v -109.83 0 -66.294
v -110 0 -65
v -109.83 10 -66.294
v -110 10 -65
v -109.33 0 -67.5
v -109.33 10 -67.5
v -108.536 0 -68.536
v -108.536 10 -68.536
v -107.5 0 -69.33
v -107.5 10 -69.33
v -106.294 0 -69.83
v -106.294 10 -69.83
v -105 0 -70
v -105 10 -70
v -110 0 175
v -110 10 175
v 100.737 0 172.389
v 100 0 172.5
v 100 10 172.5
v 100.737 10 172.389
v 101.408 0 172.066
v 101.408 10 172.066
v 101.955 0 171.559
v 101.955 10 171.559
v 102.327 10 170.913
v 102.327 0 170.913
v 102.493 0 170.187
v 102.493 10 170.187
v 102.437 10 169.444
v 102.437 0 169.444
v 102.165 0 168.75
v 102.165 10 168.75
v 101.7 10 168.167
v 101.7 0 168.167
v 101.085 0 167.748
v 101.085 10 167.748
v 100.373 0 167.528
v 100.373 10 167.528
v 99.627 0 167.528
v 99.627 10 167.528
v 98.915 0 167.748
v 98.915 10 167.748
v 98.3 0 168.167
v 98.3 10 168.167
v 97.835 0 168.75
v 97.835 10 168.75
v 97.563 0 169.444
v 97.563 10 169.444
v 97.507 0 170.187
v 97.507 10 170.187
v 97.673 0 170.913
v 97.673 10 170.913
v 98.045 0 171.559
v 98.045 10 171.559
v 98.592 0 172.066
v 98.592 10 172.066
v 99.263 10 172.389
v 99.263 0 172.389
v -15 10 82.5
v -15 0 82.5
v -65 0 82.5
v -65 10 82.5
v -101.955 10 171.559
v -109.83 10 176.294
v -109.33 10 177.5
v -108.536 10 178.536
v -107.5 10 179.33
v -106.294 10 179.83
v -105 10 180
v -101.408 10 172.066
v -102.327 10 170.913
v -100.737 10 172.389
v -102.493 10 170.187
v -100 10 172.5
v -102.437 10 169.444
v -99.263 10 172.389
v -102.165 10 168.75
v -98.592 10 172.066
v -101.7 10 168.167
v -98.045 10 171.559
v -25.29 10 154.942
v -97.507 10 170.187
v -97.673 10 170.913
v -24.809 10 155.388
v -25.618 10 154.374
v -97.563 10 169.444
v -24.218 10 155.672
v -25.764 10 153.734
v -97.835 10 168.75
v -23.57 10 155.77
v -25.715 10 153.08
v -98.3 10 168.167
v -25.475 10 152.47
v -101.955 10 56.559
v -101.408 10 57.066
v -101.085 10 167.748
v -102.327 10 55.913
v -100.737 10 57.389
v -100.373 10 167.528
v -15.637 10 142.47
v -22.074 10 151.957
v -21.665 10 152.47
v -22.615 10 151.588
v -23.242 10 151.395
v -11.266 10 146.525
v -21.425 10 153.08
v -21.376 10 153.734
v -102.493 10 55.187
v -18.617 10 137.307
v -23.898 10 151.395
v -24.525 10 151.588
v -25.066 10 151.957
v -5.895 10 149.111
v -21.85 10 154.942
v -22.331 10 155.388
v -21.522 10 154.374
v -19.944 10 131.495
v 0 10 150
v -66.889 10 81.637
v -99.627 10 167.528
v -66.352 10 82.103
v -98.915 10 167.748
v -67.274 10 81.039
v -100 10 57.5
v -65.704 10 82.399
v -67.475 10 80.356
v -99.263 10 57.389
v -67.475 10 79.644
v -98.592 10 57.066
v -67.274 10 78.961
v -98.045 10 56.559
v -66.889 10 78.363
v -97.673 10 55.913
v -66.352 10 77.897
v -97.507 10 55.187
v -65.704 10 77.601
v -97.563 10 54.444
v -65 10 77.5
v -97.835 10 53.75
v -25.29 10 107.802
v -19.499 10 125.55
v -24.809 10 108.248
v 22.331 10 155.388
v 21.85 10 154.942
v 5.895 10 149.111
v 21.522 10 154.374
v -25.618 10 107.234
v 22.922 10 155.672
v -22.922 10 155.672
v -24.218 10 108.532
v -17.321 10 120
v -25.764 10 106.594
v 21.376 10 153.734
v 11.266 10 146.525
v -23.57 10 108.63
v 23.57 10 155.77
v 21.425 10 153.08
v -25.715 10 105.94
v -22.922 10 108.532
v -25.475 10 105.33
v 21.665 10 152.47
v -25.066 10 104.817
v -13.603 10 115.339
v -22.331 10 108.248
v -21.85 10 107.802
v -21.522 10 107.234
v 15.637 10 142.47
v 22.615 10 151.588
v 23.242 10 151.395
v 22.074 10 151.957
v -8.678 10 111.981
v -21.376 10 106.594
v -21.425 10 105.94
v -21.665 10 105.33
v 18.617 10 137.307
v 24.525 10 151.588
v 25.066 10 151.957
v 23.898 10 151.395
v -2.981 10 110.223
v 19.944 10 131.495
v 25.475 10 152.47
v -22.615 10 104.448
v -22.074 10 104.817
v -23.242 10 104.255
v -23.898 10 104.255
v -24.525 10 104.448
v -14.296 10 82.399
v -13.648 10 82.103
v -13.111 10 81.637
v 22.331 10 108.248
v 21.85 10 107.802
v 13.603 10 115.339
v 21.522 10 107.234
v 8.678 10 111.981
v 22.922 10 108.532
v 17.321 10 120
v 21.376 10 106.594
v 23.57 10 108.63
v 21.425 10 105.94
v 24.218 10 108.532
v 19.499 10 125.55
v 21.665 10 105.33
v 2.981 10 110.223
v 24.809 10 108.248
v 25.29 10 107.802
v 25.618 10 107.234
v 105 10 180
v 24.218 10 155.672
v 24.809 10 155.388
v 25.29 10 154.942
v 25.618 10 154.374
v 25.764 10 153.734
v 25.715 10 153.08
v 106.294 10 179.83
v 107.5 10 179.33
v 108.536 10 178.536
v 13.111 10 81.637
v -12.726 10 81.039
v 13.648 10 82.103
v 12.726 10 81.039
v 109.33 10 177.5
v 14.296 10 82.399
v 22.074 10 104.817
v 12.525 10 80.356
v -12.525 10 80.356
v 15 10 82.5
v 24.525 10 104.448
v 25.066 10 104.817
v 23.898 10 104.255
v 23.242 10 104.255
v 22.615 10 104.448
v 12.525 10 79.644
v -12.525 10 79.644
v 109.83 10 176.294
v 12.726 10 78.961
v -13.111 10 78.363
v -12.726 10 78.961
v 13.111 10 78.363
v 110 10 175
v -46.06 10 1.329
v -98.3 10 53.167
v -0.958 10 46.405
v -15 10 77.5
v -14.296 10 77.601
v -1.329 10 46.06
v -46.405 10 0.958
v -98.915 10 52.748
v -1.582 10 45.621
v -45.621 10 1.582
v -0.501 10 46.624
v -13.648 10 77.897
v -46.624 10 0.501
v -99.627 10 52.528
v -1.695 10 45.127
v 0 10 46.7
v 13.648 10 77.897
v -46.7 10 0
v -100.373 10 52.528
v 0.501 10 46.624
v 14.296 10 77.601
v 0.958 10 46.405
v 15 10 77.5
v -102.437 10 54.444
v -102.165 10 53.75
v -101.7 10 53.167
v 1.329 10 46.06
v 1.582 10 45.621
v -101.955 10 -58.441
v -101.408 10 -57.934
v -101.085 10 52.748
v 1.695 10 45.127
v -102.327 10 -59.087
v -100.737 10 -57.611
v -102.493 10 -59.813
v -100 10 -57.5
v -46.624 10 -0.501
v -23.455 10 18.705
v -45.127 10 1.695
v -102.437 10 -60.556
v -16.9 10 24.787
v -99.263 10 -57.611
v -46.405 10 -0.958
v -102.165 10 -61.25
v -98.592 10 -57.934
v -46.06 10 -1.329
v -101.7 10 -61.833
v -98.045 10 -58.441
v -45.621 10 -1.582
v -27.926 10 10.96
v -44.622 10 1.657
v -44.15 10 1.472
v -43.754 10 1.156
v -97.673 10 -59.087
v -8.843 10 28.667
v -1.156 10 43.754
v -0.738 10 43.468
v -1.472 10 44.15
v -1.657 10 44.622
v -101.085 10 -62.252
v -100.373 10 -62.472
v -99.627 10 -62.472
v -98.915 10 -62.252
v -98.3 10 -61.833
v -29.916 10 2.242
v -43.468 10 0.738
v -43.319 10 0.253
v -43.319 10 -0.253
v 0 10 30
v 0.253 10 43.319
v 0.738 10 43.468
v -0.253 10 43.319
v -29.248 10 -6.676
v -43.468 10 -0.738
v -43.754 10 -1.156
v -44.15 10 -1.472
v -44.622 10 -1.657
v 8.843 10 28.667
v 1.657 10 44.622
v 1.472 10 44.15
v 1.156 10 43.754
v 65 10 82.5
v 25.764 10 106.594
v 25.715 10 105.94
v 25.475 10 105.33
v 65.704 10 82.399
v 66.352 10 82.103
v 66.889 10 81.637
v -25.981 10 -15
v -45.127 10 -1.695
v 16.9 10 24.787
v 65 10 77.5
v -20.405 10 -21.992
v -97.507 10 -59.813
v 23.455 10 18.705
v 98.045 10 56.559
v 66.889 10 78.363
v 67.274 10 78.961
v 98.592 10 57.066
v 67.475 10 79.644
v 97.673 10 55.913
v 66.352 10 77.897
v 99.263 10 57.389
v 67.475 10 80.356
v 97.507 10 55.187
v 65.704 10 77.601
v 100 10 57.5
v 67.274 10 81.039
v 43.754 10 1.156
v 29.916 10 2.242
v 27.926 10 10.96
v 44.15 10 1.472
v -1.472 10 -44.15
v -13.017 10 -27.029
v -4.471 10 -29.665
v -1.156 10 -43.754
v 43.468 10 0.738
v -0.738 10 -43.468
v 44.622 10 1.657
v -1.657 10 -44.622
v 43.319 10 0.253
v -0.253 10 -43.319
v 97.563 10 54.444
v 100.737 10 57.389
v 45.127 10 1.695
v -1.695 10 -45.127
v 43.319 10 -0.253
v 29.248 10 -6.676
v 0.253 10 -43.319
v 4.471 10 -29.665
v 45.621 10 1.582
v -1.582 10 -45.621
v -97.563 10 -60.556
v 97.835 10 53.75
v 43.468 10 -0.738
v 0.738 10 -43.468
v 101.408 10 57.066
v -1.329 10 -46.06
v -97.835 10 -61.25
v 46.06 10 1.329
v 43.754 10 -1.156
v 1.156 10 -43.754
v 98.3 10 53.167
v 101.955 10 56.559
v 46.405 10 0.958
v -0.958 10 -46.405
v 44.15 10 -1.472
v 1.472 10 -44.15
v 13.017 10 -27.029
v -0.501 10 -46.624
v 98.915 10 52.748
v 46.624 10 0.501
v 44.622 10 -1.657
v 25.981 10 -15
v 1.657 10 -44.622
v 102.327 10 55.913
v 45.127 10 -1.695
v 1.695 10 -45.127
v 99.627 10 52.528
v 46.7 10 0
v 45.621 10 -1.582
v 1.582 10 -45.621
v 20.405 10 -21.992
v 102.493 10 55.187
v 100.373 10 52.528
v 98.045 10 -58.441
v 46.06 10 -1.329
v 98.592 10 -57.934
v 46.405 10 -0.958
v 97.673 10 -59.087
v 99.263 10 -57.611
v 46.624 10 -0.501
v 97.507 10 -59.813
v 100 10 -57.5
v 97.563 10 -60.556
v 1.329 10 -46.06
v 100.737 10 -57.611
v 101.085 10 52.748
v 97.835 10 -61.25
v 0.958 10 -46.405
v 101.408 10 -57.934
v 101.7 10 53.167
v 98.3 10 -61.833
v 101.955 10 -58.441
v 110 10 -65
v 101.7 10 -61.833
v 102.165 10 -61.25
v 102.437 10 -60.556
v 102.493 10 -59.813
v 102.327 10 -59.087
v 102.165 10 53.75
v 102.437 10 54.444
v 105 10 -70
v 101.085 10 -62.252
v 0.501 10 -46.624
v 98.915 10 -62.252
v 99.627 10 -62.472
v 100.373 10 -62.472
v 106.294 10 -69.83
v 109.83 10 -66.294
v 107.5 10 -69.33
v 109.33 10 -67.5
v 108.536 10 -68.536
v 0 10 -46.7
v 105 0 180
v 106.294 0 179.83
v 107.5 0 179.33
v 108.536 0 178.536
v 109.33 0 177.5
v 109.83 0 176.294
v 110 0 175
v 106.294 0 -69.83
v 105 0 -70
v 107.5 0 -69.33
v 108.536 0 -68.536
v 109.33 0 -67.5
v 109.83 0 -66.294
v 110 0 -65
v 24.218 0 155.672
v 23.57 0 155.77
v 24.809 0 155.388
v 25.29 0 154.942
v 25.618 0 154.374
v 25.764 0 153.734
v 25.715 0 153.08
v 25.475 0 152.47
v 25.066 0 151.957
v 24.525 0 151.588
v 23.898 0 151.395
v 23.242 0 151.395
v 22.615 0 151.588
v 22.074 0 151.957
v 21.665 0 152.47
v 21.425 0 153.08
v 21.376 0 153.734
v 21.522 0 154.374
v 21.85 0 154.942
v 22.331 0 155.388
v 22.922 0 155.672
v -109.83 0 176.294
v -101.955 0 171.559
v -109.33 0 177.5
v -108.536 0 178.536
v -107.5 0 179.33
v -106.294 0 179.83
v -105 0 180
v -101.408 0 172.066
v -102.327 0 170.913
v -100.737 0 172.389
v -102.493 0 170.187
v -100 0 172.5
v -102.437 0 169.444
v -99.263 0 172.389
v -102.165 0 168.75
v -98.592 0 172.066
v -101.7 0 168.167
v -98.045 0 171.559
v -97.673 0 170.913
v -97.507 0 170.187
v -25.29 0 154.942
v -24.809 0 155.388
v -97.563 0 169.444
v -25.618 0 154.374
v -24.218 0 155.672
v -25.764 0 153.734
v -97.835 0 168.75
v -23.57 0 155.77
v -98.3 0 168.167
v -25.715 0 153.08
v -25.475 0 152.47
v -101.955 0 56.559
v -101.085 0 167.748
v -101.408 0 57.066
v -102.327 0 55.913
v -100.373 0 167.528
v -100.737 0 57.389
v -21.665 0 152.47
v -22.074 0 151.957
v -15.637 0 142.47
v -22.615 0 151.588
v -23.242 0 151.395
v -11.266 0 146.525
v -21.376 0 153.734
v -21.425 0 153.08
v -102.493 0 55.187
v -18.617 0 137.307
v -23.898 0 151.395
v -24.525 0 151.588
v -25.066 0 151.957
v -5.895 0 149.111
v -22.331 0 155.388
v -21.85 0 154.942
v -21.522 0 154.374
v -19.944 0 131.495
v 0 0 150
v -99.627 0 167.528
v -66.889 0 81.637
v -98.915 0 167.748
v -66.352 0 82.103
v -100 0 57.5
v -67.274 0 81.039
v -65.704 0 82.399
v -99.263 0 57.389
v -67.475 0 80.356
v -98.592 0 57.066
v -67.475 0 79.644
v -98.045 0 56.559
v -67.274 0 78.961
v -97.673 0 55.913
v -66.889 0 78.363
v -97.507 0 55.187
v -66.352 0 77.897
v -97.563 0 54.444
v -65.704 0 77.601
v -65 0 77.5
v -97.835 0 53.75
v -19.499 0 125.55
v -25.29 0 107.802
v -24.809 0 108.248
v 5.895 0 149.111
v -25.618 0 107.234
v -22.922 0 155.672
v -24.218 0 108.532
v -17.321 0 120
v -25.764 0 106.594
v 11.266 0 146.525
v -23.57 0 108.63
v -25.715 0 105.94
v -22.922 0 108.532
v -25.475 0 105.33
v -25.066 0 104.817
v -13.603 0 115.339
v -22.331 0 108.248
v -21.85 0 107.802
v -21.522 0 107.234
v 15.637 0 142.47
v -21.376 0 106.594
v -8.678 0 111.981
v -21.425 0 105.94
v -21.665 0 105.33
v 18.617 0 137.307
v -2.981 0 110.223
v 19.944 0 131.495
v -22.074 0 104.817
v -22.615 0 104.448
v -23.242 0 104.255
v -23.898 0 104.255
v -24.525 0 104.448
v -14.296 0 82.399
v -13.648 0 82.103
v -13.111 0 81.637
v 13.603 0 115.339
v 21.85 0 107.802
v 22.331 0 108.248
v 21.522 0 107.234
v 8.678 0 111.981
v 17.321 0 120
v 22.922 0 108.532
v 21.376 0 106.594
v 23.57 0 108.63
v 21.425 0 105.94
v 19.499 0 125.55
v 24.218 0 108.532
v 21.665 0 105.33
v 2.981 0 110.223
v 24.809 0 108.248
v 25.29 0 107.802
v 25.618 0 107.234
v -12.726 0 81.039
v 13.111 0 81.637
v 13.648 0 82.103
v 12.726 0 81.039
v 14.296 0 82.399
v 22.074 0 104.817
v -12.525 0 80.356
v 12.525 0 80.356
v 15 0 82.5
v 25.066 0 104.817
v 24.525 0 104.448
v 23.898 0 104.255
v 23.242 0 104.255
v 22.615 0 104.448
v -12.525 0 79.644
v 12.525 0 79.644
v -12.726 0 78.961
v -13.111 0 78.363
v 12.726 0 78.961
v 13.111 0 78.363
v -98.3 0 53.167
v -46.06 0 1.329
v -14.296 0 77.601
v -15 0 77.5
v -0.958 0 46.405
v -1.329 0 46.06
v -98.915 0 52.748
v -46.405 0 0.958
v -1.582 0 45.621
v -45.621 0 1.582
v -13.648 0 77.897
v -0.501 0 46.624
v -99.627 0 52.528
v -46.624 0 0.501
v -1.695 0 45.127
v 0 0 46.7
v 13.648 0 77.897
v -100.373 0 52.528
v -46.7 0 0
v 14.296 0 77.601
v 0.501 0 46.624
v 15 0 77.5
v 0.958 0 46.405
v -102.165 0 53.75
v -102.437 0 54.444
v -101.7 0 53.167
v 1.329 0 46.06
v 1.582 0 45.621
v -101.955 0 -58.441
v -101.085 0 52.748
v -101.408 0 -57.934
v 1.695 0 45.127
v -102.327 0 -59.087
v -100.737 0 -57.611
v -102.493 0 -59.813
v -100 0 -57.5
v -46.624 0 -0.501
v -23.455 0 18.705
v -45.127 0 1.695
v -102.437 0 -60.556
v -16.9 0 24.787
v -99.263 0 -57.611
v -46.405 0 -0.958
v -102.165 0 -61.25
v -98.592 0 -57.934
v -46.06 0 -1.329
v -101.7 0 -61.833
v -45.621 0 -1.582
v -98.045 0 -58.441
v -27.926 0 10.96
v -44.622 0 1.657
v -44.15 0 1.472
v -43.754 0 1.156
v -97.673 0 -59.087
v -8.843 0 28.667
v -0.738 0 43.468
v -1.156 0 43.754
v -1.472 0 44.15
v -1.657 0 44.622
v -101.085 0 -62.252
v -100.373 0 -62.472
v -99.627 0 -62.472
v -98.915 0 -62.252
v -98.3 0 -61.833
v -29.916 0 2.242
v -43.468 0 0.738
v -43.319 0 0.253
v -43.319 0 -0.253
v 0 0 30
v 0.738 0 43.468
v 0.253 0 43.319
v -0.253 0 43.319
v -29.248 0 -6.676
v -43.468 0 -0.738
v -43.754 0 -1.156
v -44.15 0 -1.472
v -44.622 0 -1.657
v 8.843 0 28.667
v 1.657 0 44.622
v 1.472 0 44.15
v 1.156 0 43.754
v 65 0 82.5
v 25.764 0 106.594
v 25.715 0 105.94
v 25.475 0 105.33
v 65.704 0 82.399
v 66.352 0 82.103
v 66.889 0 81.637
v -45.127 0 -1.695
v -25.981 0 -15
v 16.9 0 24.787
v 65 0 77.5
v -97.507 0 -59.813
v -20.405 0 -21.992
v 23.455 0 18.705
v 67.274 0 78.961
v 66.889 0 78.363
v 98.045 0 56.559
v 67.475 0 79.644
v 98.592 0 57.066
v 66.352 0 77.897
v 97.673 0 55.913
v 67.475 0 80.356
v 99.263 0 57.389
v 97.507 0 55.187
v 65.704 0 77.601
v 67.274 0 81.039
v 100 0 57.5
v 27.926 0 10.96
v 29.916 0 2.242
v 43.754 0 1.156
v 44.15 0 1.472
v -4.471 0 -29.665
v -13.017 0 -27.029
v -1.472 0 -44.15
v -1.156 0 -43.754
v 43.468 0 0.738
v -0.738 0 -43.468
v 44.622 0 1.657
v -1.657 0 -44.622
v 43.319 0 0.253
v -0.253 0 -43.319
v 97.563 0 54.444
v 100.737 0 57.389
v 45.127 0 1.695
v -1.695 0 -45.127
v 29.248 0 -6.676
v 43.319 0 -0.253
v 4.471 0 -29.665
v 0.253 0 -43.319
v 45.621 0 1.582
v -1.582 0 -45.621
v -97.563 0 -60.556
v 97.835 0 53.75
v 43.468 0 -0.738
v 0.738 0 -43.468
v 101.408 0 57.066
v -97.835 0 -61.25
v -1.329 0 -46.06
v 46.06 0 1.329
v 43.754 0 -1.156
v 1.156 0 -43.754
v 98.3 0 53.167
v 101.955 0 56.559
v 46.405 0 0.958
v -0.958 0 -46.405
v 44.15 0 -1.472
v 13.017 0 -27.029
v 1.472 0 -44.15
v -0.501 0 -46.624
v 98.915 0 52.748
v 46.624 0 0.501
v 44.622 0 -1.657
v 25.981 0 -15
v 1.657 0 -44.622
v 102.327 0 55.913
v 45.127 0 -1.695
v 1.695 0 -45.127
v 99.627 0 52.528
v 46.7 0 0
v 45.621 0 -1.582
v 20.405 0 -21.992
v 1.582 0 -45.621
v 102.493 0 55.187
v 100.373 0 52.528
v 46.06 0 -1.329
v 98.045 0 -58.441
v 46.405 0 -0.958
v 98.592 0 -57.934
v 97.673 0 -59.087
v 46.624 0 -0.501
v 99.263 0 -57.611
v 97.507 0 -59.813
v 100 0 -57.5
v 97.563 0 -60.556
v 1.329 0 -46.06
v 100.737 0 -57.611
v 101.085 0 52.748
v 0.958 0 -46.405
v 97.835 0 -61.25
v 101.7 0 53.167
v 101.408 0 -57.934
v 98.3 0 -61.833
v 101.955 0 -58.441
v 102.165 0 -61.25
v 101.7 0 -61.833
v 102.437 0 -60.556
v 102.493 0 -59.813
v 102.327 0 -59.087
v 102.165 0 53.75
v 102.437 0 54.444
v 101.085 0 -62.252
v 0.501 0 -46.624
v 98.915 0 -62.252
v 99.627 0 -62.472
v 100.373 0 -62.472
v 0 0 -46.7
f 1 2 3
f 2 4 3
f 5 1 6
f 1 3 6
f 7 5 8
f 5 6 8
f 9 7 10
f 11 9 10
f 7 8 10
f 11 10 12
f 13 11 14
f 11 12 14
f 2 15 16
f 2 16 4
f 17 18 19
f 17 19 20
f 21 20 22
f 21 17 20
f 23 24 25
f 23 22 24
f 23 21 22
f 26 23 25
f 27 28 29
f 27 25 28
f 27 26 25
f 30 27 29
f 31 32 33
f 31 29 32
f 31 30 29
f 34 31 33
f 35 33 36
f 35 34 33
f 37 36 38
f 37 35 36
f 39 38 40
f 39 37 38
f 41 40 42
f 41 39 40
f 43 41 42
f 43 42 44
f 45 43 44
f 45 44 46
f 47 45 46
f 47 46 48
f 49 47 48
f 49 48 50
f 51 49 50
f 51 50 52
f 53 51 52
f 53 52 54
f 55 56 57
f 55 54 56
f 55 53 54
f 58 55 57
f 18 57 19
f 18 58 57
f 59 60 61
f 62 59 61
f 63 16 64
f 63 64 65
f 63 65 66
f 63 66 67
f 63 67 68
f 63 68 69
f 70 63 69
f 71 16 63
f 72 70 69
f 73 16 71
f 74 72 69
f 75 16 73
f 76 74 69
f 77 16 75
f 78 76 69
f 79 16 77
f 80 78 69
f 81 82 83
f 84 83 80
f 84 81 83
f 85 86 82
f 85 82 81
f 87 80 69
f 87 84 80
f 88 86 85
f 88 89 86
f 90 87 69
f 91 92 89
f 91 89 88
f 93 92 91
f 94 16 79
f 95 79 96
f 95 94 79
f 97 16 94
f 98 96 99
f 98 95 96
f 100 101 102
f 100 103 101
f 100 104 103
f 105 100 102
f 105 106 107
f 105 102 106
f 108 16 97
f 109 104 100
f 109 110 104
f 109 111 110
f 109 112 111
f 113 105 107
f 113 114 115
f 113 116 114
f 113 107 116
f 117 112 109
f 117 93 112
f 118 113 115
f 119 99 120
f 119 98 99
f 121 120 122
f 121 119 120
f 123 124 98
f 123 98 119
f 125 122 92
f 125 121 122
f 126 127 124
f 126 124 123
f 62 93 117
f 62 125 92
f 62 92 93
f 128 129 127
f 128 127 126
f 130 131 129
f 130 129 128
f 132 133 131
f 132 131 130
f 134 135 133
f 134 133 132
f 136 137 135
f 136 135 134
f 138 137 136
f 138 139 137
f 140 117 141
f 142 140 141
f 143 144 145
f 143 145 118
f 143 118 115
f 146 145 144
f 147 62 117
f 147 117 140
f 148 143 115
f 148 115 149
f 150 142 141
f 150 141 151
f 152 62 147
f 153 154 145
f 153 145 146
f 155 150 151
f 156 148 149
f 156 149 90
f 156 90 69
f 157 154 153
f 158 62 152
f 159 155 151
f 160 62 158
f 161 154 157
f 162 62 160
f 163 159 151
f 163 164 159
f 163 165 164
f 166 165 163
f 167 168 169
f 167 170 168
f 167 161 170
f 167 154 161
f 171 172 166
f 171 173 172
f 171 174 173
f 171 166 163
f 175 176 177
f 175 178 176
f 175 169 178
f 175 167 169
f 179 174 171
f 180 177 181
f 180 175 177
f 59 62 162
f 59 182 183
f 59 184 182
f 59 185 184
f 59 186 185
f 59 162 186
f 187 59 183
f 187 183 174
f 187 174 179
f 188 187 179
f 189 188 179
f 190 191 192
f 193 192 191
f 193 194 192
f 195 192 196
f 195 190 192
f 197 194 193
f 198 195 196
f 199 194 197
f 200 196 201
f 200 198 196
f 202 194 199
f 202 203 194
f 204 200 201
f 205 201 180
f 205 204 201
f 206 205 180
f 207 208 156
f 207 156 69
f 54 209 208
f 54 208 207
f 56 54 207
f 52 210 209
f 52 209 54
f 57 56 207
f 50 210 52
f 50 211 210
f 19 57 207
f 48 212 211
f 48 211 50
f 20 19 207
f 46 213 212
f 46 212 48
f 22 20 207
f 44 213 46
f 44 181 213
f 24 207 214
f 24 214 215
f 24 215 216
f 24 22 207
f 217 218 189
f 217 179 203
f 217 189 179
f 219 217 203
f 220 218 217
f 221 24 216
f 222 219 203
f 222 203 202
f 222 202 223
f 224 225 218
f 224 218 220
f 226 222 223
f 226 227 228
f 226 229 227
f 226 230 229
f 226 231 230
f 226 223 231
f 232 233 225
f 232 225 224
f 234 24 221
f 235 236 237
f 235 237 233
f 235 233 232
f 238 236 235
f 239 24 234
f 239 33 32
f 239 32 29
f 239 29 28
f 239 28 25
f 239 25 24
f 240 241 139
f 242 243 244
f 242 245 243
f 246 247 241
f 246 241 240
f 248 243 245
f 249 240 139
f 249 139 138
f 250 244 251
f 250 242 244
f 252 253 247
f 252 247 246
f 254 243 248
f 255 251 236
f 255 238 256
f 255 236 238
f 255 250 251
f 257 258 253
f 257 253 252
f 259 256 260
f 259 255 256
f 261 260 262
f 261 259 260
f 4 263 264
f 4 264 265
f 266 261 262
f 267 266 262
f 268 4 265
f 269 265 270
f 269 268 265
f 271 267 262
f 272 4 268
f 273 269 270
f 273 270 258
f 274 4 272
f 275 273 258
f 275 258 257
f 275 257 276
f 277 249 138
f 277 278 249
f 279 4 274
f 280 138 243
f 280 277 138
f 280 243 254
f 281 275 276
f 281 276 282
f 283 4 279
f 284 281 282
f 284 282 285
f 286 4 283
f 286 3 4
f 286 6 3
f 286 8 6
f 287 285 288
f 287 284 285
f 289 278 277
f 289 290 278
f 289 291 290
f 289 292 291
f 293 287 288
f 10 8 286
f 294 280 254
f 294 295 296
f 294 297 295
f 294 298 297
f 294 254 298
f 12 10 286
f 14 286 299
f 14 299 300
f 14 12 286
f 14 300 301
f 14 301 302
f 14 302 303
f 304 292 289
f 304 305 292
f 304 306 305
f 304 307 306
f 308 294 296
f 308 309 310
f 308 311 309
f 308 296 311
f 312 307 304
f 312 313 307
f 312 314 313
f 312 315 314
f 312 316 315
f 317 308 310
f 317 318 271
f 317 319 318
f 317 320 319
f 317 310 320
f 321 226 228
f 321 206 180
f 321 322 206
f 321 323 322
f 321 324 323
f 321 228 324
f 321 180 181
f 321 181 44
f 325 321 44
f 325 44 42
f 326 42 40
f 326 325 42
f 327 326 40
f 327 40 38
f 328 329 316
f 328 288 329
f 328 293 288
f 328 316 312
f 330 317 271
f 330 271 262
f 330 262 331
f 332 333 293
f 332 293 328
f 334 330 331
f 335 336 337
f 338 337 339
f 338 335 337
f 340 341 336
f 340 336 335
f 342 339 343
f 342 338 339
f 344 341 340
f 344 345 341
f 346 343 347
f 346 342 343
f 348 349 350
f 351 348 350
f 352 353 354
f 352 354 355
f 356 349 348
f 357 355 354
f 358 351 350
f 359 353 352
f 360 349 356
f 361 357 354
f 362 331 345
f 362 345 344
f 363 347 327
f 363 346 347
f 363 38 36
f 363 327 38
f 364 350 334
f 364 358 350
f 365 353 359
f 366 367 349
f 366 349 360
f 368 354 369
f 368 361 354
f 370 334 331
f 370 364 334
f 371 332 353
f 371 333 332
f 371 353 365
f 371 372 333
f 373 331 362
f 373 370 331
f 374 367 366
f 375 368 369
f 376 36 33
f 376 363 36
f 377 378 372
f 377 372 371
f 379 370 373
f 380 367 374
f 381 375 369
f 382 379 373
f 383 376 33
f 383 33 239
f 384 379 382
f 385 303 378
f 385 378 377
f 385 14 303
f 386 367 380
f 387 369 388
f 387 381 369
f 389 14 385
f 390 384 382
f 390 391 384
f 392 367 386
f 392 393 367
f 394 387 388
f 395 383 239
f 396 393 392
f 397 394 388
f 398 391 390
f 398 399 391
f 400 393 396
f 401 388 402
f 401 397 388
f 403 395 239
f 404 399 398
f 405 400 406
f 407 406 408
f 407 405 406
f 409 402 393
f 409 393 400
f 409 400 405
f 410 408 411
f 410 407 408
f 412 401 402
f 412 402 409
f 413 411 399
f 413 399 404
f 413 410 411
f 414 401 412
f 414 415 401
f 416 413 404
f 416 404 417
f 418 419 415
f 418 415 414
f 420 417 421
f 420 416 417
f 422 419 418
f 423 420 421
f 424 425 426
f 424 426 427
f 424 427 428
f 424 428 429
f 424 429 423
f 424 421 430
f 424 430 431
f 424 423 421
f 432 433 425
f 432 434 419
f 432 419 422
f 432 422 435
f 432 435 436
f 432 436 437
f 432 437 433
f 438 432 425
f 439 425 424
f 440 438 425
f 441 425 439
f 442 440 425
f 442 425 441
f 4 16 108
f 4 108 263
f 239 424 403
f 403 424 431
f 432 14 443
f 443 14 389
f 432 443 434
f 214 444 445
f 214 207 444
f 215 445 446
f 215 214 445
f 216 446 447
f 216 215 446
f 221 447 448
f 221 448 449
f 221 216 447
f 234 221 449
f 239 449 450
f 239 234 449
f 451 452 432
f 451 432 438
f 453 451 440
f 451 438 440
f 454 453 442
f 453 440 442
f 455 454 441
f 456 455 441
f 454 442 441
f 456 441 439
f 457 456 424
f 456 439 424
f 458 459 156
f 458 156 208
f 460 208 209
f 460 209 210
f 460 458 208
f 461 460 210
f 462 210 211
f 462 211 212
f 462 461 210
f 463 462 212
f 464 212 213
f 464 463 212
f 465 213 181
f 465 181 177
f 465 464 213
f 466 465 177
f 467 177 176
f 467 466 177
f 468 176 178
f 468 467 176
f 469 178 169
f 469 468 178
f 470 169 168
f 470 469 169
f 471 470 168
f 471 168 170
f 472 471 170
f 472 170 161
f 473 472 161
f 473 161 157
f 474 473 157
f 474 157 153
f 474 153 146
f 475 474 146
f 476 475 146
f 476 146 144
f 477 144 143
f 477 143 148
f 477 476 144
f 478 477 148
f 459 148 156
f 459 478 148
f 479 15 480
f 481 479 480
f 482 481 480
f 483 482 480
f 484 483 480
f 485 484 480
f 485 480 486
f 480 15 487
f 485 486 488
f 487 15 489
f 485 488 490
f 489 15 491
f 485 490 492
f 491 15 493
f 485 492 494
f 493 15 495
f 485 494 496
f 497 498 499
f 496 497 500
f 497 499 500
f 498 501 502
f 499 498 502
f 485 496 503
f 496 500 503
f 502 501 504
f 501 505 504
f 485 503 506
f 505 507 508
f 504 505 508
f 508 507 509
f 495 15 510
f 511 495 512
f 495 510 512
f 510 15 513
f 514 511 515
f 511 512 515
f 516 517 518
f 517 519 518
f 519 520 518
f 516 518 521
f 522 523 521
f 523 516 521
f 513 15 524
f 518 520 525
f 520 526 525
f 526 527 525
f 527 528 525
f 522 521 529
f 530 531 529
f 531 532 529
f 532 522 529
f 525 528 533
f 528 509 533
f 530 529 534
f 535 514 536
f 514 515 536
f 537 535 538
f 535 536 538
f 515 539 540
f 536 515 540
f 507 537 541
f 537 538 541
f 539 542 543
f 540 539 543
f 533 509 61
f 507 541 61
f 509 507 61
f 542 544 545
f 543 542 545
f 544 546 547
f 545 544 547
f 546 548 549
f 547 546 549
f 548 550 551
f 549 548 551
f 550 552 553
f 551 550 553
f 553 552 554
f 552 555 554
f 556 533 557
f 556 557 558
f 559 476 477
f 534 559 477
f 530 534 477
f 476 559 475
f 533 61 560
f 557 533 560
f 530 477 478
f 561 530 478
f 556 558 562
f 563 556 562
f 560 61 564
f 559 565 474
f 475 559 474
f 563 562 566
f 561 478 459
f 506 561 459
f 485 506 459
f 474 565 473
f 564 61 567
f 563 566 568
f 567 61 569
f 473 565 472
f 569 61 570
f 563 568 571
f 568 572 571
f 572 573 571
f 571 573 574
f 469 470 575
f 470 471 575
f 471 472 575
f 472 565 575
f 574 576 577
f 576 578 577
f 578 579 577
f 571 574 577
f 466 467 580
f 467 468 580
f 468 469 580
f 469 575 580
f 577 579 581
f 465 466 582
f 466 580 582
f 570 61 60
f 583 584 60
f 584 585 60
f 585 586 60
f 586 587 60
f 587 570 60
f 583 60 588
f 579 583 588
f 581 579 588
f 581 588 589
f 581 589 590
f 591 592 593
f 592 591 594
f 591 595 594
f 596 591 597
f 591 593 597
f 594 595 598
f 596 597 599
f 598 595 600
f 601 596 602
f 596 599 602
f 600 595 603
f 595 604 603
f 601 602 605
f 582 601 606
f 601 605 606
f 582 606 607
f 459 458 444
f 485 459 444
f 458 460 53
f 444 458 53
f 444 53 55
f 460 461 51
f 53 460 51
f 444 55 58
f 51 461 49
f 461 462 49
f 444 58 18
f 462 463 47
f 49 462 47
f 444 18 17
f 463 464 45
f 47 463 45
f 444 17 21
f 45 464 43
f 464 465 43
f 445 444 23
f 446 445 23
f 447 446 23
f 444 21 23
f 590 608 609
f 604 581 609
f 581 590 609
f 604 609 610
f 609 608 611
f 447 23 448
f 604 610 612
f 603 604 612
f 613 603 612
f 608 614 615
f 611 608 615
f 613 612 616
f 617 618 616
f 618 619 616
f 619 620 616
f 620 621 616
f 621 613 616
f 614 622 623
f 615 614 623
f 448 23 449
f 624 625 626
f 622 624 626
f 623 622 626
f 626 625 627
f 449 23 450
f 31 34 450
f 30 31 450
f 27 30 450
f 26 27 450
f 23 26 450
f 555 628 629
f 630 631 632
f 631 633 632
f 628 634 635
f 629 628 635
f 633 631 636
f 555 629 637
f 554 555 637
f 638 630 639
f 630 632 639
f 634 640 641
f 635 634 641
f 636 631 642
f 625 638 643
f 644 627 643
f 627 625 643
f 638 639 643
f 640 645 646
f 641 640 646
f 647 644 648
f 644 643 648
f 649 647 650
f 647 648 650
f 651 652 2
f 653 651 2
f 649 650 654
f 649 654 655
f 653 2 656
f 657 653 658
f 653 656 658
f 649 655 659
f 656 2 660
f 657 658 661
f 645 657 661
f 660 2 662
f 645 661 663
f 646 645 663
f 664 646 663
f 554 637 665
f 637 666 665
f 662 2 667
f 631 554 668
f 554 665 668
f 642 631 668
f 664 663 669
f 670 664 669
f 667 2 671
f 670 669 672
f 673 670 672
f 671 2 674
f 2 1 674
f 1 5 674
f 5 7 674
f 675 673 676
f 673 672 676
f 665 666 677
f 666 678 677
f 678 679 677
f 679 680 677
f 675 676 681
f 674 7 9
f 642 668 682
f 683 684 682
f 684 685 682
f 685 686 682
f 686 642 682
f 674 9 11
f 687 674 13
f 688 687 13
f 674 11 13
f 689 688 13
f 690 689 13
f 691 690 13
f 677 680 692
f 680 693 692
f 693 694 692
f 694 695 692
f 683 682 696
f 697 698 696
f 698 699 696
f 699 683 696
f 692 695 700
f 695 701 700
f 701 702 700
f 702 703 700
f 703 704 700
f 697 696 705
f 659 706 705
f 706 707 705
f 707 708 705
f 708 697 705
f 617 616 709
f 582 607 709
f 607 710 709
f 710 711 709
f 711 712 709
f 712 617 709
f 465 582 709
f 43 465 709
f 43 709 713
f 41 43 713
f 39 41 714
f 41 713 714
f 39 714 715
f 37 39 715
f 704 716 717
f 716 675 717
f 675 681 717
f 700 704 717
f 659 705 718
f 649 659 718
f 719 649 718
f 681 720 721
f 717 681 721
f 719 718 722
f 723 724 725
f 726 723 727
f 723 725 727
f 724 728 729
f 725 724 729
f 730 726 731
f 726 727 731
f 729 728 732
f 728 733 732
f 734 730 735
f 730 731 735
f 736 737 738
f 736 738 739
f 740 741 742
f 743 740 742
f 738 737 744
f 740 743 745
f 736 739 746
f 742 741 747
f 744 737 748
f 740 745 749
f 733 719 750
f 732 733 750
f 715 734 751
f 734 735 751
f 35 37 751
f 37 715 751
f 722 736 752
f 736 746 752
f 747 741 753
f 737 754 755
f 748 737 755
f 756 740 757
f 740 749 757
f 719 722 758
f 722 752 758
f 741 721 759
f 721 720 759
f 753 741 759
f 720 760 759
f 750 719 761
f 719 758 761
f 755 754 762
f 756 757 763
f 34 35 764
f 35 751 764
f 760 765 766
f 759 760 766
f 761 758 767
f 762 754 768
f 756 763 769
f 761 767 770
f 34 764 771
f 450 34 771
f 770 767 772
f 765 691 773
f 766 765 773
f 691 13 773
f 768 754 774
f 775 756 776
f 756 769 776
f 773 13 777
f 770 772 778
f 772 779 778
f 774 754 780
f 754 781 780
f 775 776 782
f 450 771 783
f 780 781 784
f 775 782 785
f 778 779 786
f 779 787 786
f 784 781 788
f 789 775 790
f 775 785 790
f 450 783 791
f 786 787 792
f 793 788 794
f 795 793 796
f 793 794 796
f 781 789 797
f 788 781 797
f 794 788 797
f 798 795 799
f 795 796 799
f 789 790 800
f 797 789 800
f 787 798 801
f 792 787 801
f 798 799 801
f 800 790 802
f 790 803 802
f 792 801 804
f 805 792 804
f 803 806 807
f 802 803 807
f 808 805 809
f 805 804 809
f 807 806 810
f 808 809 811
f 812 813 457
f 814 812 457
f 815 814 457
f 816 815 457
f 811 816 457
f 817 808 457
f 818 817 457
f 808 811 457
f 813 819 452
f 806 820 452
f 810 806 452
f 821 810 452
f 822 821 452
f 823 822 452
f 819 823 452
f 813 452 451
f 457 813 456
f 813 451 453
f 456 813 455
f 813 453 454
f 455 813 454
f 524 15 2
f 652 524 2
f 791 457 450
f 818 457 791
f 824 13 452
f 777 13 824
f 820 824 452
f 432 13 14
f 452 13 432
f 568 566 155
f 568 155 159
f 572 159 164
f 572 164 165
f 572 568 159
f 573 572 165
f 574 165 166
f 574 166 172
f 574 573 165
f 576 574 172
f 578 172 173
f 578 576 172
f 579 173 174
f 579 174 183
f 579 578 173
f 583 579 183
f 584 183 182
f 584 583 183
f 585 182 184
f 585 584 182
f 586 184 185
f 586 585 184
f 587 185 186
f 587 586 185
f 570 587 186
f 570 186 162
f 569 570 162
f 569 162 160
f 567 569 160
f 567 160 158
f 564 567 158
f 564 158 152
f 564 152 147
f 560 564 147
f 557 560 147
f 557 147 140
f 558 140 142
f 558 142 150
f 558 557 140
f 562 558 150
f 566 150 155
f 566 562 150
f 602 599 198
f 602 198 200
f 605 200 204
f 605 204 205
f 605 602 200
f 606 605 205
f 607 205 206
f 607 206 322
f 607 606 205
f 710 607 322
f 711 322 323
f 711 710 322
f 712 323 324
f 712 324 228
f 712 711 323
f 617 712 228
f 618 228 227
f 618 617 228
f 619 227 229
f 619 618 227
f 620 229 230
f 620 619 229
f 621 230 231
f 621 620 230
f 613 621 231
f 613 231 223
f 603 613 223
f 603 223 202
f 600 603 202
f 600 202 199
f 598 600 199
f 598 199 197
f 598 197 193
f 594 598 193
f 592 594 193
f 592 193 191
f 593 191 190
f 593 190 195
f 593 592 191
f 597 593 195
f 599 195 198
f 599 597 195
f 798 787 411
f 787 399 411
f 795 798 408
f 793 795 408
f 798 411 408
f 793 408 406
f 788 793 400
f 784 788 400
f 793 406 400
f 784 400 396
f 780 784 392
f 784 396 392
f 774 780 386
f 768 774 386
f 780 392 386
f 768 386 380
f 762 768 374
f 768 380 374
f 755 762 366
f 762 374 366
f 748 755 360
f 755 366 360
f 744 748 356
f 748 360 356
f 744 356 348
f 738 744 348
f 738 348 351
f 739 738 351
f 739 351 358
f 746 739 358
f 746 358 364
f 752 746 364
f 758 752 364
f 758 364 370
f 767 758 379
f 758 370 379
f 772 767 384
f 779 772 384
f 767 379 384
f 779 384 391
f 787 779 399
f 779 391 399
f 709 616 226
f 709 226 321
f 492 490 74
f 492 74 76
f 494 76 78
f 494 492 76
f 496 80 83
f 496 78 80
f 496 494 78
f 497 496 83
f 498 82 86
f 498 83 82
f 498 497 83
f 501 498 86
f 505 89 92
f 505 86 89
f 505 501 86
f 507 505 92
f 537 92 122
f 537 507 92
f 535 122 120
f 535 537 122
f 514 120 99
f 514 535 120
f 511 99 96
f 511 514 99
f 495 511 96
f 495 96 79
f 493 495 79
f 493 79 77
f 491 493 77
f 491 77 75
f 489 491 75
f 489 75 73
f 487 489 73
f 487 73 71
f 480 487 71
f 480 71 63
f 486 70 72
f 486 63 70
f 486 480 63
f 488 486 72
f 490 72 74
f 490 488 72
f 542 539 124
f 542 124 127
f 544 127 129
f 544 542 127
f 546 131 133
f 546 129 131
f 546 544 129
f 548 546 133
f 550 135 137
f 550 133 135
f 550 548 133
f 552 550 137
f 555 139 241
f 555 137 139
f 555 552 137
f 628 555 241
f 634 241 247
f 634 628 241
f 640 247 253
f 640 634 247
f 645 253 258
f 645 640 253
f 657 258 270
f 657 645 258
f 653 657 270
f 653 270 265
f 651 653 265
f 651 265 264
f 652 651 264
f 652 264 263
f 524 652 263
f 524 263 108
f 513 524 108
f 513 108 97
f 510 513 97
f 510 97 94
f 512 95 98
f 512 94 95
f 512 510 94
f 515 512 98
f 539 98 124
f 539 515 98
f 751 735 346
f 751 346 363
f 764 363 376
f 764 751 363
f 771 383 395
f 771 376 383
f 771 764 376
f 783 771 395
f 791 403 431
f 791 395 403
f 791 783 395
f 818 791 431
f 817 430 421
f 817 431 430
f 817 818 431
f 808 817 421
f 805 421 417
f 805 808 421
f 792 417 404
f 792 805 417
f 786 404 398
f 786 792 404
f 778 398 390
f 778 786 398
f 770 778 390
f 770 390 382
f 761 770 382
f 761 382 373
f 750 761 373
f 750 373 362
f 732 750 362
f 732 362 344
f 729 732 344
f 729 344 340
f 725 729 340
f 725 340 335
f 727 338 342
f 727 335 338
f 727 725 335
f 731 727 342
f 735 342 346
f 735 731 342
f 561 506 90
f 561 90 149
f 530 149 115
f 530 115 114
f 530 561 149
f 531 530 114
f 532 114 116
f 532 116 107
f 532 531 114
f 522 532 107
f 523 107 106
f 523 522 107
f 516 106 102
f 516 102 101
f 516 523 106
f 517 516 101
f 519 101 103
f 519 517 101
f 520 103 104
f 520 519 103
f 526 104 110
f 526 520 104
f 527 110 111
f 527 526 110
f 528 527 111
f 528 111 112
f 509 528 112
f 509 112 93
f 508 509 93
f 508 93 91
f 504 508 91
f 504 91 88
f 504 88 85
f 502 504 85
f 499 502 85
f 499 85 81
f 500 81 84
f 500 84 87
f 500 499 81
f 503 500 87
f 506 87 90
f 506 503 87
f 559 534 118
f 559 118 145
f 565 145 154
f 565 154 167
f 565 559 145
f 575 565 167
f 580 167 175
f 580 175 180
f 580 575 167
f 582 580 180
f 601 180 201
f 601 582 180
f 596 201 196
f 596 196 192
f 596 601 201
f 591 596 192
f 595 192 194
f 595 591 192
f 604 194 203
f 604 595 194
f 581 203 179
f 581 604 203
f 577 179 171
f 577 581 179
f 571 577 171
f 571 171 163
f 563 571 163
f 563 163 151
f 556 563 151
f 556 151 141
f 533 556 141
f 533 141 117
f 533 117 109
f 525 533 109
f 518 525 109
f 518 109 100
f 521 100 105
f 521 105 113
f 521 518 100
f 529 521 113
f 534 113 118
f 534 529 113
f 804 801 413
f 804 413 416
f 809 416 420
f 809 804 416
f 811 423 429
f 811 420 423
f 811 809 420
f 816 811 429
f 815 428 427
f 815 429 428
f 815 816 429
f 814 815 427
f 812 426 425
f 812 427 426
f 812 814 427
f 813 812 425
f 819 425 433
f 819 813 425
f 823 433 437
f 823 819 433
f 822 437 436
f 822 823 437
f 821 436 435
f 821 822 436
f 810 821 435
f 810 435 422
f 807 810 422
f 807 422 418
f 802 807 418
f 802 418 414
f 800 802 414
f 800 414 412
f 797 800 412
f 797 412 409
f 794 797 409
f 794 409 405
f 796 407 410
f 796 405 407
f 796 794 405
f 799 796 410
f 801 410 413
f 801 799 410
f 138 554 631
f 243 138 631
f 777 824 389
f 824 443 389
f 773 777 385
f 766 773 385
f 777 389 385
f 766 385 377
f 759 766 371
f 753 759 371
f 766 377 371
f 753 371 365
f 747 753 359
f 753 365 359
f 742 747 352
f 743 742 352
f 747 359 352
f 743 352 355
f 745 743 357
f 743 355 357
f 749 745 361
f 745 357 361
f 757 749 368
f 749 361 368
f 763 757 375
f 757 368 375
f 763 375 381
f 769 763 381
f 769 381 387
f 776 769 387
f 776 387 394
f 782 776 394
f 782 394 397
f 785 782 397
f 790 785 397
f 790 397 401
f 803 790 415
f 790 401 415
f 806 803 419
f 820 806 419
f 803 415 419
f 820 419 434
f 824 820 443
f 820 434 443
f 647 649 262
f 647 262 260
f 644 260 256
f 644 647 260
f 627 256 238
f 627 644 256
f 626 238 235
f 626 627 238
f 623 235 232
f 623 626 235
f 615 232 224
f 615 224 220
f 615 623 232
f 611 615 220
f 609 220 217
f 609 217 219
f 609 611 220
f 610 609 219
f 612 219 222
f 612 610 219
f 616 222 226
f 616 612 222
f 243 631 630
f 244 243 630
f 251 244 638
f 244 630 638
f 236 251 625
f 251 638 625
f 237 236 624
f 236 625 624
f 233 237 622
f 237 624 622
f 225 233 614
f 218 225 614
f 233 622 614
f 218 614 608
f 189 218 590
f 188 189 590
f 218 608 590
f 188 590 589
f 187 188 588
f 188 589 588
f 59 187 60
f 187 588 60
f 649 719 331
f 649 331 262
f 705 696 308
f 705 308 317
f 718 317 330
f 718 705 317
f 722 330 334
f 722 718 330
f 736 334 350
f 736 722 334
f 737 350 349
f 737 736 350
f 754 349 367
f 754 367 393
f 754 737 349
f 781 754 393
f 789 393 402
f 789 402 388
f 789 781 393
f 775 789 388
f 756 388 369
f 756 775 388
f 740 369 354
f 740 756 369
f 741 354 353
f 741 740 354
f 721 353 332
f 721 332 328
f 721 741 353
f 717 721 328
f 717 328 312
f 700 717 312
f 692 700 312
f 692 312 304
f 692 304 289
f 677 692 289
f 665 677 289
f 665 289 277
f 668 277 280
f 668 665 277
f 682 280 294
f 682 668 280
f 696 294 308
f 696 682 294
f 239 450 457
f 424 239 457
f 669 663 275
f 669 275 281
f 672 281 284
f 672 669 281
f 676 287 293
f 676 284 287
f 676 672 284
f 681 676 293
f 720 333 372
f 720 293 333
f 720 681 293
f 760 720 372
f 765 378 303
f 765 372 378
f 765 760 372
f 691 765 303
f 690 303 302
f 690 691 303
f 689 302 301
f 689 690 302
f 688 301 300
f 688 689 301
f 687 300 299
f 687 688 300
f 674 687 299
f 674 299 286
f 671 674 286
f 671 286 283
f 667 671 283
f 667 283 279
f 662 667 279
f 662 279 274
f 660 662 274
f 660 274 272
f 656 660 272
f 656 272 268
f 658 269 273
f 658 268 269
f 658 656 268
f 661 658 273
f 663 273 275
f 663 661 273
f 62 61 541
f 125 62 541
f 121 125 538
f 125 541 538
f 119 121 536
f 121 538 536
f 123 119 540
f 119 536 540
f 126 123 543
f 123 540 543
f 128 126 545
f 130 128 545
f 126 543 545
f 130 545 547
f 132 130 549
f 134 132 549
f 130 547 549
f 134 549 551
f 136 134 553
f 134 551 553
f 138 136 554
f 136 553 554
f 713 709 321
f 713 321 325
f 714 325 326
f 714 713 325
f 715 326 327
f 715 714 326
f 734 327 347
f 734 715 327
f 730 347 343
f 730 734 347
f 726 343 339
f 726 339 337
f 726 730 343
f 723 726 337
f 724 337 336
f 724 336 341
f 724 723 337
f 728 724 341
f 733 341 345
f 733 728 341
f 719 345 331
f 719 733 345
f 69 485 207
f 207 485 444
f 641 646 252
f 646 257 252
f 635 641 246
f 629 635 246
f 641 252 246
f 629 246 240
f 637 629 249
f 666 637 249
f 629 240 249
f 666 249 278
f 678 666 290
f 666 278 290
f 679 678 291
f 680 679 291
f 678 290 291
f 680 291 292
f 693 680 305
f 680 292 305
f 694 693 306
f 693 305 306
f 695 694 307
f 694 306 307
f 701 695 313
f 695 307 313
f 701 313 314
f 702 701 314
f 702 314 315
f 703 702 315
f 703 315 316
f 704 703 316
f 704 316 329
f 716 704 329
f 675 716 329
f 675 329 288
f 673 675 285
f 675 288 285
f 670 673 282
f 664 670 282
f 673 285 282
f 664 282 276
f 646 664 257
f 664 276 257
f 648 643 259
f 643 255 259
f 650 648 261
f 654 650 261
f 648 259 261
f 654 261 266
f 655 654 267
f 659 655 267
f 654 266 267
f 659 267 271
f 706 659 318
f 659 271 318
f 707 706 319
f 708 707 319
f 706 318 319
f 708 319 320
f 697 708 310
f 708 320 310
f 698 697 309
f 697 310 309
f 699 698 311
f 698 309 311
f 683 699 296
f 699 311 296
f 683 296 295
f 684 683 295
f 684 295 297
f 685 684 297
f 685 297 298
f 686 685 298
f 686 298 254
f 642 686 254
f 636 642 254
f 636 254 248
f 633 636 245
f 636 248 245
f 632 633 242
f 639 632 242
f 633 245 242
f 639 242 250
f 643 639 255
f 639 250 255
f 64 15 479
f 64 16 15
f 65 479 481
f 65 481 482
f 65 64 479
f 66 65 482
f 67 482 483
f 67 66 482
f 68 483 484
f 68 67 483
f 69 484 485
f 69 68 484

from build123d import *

# Parameters (mm, degrees)
SKETCH1_W               = 220
SKETCH1_H               = 250
SKETCH1_R               = 30
SKETCH1_R_2             = 20
SKETCH1_R_3             = 2.2
BOSS_EXTRUDE1_DEPTH     = 10
CUT_EXTRUDE1_DEPTH      = 212.187120819
CUT_EXTRUDE1_DEPTH_BACK = 212.187120819
SKETCH2_R               = 2.5
FILLET1_R               = 5
SKETCH4_R               = 1.7
CUT_EXTRUDE2_DEPTH      = 212.187120819
CIRPATTERN1_COUNT       = 4


with BuildPart() as part:
    # Sketch1 → Boss-Extrude1 (new body)
    with BuildSketch(Plane(origin=(0, 0, 0), x_dir=(1, 0, 0), z_dir=(0, 1, 0))):
        with Locations((0, -55)):
            Rectangle(SKETCH1_W, SKETCH1_H)
        with Locations(Location((0, 0, 0), (0, 0, 270))):
            Circle(SKETCH1_R, mode=Mode.SUBTRACT)
        with Locations(Location((0, -130, 0), (0, 0, 270))):
            Circle(SKETCH1_R_2, mode=Mode.SUBTRACT)
        with Locations(Location((-23.57, -106.43, 0), (0, 0, 270))):
            Circle(SKETCH1_R_3, mode=Mode.SUBTRACT)
        with Locations(Location((23.57, -106.43, 0), (0, 0, 270))):
            Circle(SKETCH1_R_3, mode=Mode.SUBTRACT)
        with Locations(Location((-23.57, -153.57, 0), (0, 0, 270))):
            Circle(SKETCH1_R_3, mode=Mode.SUBTRACT)
        with Locations(Location((23.57, -153.57, 0), (0, 0, 270))):
            Circle(SKETCH1_R_3, mode=Mode.SUBTRACT)
        with BuildLine():
            Line((-65, -77.5), (-15, -77.5))
            ThreePointArc((-15, -77.5), (-12.5, -80), (-15, -82.5))
            Line((-15, -82.5), (-65, -82.5))
            ThreePointArc((-65, -82.5), (-67.5, -80), (-65, -77.5))
        make_face(mode=Mode.SUBTRACT)
        with BuildLine():
            Line((65, -77.5), (15, -77.5))
            ThreePointArc((15, -77.5), (12.5, -80), (15, -82.5))
            Line((15, -82.5), (65, -82.5))
            ThreePointArc((65, -82.5), (67.5, -80), (65, -77.5))
        make_face(mode=Mode.SUBTRACT)
    extrude(amount=BOSS_EXTRUDE1_DEPTH)

    # Sketch2 → Cut-Extrude1 (cut, two sides: drawn at the far end of the back side and taken through both)
    with BuildSketch(Plane(origin=(0, 10, 0), x_dir=(1, 0, 0), z_dir=(0, 1, 0)).offset(-CUT_EXTRUDE1_DEPTH_BACK)):
        with Locations(Location((-100, 60, 0), (0, 0, 270))):
            Circle(SKETCH2_R)
        with Locations(Location((100, 60, 0), (0, 0, 270))):
            Circle(SKETCH2_R)
        with Locations(Location((-100, -170, 0), (0, 0, 270))):
            Circle(SKETCH2_R)
        with Locations(Location((100, -170, 0), (0, 0, 270))):
            Circle(SKETCH2_R)
        with Locations(Location((-100, -55, 0), (0, 0, 270))):
            Circle(SKETCH2_R)
        with Locations(Location((100, -55, 0), (0, 0, 270))):
            Circle(SKETCH2_R)
    extrude(amount=CUT_EXTRUDE1_DEPTH + CUT_EXTRUDE1_DEPTH_BACK, mode=Mode.SUBTRACT)

    # Fillet1
    fillet1_edges = [part.edges().sort_by_distance(p)[0] for p in [
        (-110, 5, -70),
        (110, 5, -70),
        (110, 5, 180),
        (-110, 5, 180),
    ]]
    fillet(fillet1_edges, radius=FILLET1_R)

    # Sketch4 → Cut-Extrude2 (cut, symmetric)
    with BuildSketch(Plane(origin=(0, 10, 0), x_dir=(1, 0, 0), z_dir=(0, 1, 0))):
        with Locations(Location((0, -45, 0), (0, 0, 270))):
            Circle(SKETCH4_R)
    cut_extrude2 = extrude(amount=CUT_EXTRUDE2_DEPTH, both=True, mode=Mode.SUBTRACT)

    # CirPattern1: Cut-Extrude2 ×4 about axis
    cirpattern1_axis = Axis((0, 0, 0), (0, 1, 0))
    for i in range(1, CIRPATTERN1_COUNT):
        add(cut_extrude2.rotate(cirpattern1_axis, i * 360 / CIRPATTERN1_COUNT), mode=Mode.SUBTRACT)


solid = part.part
